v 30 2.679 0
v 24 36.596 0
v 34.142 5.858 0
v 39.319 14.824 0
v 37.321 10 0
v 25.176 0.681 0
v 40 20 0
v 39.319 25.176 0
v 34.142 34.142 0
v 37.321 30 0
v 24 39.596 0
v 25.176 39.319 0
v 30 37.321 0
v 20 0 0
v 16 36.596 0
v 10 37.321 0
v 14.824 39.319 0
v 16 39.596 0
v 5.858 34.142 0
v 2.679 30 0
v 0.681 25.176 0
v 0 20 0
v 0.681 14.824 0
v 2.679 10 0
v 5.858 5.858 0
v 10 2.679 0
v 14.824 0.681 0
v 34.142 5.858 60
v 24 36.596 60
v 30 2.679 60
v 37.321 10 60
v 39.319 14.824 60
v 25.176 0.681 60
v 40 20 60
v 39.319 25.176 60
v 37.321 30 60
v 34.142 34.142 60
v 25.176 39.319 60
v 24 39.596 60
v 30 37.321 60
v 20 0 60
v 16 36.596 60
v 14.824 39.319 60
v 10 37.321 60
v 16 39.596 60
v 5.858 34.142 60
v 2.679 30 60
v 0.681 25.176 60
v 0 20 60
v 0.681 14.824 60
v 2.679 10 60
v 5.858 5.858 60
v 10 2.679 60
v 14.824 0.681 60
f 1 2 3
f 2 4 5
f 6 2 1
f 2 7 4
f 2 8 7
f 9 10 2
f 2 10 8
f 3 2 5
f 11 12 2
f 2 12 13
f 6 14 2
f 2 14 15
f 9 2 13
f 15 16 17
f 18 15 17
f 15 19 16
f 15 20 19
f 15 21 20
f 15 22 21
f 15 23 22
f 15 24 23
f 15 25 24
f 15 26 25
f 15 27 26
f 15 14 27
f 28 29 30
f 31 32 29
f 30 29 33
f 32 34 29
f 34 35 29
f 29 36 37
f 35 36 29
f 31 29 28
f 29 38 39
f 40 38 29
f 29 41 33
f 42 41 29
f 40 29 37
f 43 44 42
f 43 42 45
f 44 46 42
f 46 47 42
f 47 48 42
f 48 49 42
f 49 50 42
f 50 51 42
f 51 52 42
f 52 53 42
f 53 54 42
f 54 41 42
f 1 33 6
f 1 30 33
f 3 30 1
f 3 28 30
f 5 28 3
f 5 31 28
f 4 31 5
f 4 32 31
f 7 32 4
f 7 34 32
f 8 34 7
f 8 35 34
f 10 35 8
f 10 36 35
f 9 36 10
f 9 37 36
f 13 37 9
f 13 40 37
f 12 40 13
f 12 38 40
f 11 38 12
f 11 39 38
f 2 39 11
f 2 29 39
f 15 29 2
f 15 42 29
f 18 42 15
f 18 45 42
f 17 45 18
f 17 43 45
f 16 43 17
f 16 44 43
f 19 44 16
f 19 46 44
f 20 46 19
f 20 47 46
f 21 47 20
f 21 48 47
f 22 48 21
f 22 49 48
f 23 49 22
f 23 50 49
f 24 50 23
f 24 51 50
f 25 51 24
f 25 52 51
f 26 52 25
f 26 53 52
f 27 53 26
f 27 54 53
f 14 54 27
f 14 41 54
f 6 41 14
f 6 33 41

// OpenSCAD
$fn = 32;

// ----------------------------------------------------------------------
// Keyway shaft: d40 shaft, key 8 x 3 mm
// ----------------------------------------------------------------------

// --- parameters (mm) ---
shaft_r = 20;             // shaft radius
key_w = 8;                // keyway width
key_d = 3;                // keyway depth below the surface line
plate_t = 60;             // shaft length, Z (extrusion height)
fit_tol = 0.1;            // declared fit tolerance (prompt contract)
free_tol = 0.5;           // declared free tolerance (prompt contract)

shaft_d = 2 * shaft_r;  // shaft diameter
circle_step = 15;  // polygon sampling step, degrees

profile = [[14.824, 39.319], [10, 37.321], [5.858, 34.142], [2.679, 30], [0.681, 25.176], [0, 20], [0.681, 14.824], [2.679, 10], [5.858, 5.858], [10, 2.679], [14.824, 0.681], [20, 0], [25.176, 0.681], [30, 2.679], [34.142, 5.858], [37.321, 10], [39.319, 14.824], [40, 20], [39.319, 25.176], [37.321, 30], [34.142, 34.142], [30, 37.321], [25.176, 39.319], [24, 39.596], [24, 36.596], [16, 36.596], [16, 39.596]];  // primary outline, 27 points, counter clockwise

// --- the one profile operation ---
linear_extrude(height = plate_t) polygon(points = profile);
